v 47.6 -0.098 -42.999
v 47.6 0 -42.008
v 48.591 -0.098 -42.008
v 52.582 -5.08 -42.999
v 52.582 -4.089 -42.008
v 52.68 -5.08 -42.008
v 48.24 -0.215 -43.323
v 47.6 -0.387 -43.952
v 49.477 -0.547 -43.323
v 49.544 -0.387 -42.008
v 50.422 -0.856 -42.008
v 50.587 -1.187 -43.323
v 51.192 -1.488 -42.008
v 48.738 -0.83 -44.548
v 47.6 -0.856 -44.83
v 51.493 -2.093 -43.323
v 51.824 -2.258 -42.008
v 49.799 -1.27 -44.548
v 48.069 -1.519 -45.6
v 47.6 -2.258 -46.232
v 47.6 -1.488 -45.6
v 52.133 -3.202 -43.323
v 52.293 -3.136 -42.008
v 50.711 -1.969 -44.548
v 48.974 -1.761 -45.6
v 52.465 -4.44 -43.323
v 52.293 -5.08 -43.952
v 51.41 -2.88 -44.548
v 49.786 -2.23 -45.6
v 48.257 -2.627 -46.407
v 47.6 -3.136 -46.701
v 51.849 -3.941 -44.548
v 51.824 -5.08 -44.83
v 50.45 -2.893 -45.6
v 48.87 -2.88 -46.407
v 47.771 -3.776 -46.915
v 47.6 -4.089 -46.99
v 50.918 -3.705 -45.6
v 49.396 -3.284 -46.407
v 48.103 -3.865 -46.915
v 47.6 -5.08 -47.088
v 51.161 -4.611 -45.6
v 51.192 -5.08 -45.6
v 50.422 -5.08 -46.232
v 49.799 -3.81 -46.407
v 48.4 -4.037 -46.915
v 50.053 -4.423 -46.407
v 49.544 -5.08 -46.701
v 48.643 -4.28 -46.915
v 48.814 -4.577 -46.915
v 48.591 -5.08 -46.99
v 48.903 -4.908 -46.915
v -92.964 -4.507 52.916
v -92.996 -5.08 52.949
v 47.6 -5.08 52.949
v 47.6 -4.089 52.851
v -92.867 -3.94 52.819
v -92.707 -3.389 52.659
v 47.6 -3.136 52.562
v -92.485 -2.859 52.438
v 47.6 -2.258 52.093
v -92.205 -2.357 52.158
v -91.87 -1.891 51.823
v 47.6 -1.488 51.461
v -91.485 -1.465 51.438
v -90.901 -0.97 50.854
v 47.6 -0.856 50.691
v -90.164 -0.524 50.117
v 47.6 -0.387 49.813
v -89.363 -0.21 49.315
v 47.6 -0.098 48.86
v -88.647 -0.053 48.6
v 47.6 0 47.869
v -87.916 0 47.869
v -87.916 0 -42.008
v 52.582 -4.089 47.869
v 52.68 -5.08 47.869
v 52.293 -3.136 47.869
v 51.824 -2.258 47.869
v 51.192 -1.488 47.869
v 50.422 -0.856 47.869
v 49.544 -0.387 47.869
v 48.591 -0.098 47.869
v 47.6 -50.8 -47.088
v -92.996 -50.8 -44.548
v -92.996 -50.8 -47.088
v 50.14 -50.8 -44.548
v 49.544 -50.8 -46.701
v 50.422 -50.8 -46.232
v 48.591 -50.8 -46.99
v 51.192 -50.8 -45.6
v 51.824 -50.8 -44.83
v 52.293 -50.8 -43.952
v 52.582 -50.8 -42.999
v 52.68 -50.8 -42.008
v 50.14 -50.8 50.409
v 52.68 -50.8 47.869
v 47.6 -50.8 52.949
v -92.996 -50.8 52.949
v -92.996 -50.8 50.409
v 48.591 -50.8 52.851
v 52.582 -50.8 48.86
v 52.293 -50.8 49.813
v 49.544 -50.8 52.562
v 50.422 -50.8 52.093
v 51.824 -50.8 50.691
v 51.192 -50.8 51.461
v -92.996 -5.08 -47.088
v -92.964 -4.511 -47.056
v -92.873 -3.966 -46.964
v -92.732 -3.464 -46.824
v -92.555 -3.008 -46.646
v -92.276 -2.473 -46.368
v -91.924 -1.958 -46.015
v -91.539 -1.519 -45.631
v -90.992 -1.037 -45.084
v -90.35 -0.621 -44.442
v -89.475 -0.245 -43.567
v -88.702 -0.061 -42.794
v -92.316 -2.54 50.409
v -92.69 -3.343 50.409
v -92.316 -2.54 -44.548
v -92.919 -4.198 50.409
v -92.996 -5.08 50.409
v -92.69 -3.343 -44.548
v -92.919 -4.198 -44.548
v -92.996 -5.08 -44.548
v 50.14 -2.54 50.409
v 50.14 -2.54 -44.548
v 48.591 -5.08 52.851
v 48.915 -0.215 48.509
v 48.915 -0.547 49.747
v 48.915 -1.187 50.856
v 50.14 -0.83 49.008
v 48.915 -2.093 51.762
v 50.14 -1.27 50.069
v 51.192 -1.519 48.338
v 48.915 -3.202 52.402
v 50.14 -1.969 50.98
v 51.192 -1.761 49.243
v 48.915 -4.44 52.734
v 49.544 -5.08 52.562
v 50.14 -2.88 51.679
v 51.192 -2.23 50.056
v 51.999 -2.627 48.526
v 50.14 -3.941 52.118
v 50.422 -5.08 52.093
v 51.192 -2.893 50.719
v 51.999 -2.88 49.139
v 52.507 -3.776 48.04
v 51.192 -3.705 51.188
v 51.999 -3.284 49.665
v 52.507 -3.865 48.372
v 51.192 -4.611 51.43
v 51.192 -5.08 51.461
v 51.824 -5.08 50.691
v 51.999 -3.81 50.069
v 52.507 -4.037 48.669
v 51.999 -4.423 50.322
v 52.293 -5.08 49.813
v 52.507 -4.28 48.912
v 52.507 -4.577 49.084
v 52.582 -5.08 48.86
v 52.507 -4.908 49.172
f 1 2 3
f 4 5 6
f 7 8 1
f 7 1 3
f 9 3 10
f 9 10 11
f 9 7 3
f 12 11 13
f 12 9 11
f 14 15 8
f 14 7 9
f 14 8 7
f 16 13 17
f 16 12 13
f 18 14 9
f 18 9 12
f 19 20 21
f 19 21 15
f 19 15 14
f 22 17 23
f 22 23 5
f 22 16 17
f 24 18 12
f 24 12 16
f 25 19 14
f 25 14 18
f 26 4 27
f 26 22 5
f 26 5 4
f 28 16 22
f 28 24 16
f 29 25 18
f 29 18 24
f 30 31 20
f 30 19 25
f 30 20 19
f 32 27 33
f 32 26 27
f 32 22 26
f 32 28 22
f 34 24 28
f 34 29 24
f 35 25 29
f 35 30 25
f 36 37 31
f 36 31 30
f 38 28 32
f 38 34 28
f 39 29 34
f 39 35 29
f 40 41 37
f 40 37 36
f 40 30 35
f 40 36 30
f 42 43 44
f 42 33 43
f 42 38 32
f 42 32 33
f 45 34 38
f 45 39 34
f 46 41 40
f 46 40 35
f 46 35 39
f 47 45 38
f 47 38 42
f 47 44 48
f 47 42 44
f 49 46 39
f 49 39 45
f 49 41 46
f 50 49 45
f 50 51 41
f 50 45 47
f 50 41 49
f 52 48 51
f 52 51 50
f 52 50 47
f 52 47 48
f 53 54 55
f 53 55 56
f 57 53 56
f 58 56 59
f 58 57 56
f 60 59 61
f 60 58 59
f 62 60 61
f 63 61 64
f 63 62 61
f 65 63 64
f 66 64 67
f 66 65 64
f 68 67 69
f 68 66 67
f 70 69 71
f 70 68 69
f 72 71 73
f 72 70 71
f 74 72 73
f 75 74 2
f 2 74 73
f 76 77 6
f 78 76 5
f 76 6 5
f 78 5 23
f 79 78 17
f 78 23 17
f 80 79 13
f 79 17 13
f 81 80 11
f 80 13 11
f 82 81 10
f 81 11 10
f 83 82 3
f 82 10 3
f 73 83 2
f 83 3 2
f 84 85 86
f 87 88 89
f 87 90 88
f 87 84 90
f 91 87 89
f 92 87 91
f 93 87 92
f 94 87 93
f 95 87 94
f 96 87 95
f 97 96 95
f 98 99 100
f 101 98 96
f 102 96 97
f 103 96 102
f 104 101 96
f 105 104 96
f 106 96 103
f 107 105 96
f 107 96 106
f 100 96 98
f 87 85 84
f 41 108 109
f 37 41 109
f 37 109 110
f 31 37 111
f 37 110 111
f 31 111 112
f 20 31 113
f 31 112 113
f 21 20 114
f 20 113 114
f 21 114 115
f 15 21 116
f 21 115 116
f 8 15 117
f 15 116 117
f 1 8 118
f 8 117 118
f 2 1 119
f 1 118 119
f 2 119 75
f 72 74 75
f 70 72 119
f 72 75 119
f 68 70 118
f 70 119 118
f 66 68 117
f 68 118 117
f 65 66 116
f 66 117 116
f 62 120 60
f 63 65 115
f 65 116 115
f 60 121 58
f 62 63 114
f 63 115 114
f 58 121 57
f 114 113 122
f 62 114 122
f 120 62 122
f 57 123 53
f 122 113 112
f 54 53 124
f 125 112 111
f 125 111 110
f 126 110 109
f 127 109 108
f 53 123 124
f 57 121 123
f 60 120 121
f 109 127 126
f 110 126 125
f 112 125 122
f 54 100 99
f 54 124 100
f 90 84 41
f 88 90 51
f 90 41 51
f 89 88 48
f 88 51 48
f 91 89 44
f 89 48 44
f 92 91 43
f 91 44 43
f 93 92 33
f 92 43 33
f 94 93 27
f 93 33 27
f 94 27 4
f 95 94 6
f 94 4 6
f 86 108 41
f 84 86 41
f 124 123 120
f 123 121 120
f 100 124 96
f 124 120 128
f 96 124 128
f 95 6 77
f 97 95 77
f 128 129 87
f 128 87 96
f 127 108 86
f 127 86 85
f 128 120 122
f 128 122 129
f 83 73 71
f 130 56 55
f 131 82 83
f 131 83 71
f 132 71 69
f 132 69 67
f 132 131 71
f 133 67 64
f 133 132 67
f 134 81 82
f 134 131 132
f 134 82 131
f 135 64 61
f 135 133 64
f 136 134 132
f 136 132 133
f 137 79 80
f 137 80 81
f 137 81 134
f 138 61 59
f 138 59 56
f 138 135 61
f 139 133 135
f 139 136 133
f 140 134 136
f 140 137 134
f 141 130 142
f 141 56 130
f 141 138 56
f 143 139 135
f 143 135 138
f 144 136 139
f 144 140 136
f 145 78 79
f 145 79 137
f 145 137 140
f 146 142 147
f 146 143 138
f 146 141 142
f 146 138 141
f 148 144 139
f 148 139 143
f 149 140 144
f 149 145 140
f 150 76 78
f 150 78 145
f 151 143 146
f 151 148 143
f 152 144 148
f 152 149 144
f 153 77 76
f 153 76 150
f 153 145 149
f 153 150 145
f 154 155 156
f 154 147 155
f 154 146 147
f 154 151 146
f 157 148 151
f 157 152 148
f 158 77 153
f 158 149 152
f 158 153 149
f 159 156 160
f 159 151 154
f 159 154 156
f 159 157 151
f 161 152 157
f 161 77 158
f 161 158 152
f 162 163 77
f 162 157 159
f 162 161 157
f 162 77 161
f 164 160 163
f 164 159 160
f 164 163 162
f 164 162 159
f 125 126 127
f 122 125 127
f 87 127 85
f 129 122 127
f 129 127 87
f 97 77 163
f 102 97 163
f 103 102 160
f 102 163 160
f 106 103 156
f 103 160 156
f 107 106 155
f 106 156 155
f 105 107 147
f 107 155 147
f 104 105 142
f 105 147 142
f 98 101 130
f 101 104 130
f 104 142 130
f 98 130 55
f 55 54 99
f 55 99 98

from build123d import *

# Parameters (mm, degrees)
F0_W         = 145.6760466099
F0_H         = 100.0369116664
F0_W_2       = 138.8105116785
F0_H_2       = 92.9268449545
F1_DEPTH     = 25.4
F2_T         = -2.54
F3_T1_DEPTH  = 171.0760466099
F3_T3_DEPTH  = 125.4369116664
F4_DEPTH     = 25.4
F5_T1_DEPTH  = 58.42
F5_S5_W      = 5.08
F5_S5_H      = 5.08
F5_T6_DEPTH  = 5.08
F5_S11_W     = 5.08
F5_S11_H     = 5.08
F5_T12_DEPTH = 5.08


# Not quite as in the source:
# - a fillet or chamfer that OpenCascade refuses, or shapes differently, is made with other operations: its cross-section is extruded or revolved along the edge and cut away or added


with BuildPart() as f1:
    # F0 (on Front) → F1 (new body)
    with BuildSketch(Plane.XZ):
        with Locations((-20.1583206654, 2.9303953052)):
            Rectangle(F0_W, F0_H)
        with Locations((-20.7056272775, 3.0381605029)):
            Rectangle(F0_W_2, F0_H_2, mode=Mode.SUBTRACT)
        with Locations((-20.7056272775, 3.0381605029)):
            Rectangle(F0_W_2, F0_H_2)
    extrude(amount=F1_DEPTH)

    # F2
    f2_openings = [f1.faces().sort_by_distance(p)[0] for p in [
        (-20.158321, -25.4, 2.930395),
        (-92.996344, -12.7, 2.930395),
    ]]
    offset(amount=F2_T, openings=f2_openings)

    # F3: fillet of radius 5.08 on 4 edges, made by hand

    # F3_s2 → F3_t1 (cut)
    with BuildSketch(Plane.YZ.offset(-105.6963439703)):
        with BuildLine():
            ThreePointArc((-5.08, 52.9488511384), (-1.4878975516, 51.4609535868), (0, 47.8688511384))
            Line((0, 47.8688511384), (0, 52.9488511384))
            Line((0, 52.9488511384), (-5.08, 52.9488511384))
        make_face()
        with BuildLine():
            ThreePointArc((-5.08, -47.088060528), (-1.4878975516, -45.6001629765), (0, -42.008060528))
            Line((0, -42.008060528), (0, -47.088060528))
            Line((0, -47.088060528), (-5.08, -47.088060528))
        make_face()
    extrude(amount=F3_T1_DEPTH, mode=Mode.SUBTRACT)

    # F3_s4 → F3_t3 (cut)
    with BuildSketch(Plane.XY.offset(-59.788060528)):
        with BuildLine():
            ThreePointArc((-87.9163439703, 0), (-91.5084464187, -1.4878975516), (-92.9963439703, -5.08))
            Line((-92.9963439703, -5.08), (-92.9963439703, 0))
            Line((-92.9963439703, 0), (-87.9163439703, 0))
        make_face()
        with BuildLine():
            ThreePointArc((52.6797026396, -5.08), (51.191805088, -1.4878975516), (47.5997026396, 0))
            Line((47.5997026396, 0), (52.6797026396, 0))
            Line((52.6797026396, 0), (52.6797026396, -5.08))
        make_face()
    extrude(amount=F3_T3_DEPTH, mode=Mode.SUBTRACT)

    # F4 (add): a face of the model
    f4_faces = [f1.faces().sort_by_distance(p)[0] for p in [
        (-20.1583206654, -25.4, 51.1816812469),
    ]]
    extrude(f4_faces, amount=F4_DEPTH)

    # F5: fillet of radius 5.08 on 2 edges, made by hand

    # F5_s2 → F5_t1 (cut)
    with BuildSketch(Plane.XZ.offset(5.08)):
        with BuildLine():
            ThreePointArc((52.6797026396, 47.8688511384), (51.191805088, 51.4609535868), (47.5997026396, 52.9488511384))
            Line((47.5997026396, 52.9488511384), (52.6797026396, 52.9488511384))
            Line((52.6797026396, 52.9488511384), (52.6797026396, 47.8688511384))
        make_face()
        with BuildLine():
            ThreePointArc((47.5997026396, -47.088060528), (51.191805088, -45.6001629765), (52.6797026396, -42.008060528))
            Line((52.6797026396, -42.008060528), (52.6797026396, -47.088060528))
            Line((52.6797026396, -47.088060528), (47.5997026396, -47.088060528))
        make_face()
    extrude(amount=F5_T1_DEPTH, mode=Mode.SUBTRACT)


with BuildPart() as f5_tool4:
    # F5_s5 → F5_t6 (new body)
    with BuildSketch(Plane.XY.offset(-42.008060528)):
        with Locations((50.1397026396, -2.54)):
            Rectangle(F5_S5_W, F5_S5_H)
    extrude(amount=-F5_T6_DEPTH)

    # F5_s7 → F5_t8 (revolve, cut)
    with BuildSketch(Plane(origin=(47.5997026396, -5.08, -42.008060528), x_dir=(-0.7071067812, -0.7071067812, 0), z_dir=(0.7071067812, -0.7071067812, 0))):
        with BuildLine():
            ThreePointArc((0, -5.08), (5.08, 0), (0, 5.08))
            Line((0, 5.08), (0, -5.08))
        make_face()
    revolve(axis=Axis((47.5997026396, -5.08, -42.008060528), (0, 0, -1)), mode=Mode.SUBTRACT)


with BuildPart() as f1_1:
    add(f1.part)

    # F5_t3: cut F5_tool4
    add(f5_tool4.part, mode=Mode.SUBTRACT)


with BuildPart() as f5_tool10:
    # F5_s11 → F5_t12 (new body)
    with BuildSketch(Plane.YZ.offset(47.5997026396)):
        with Locations((-2.54, 50.4088511384)):
            Rectangle(F5_S11_W, F5_S11_H)
    extrude(amount=F5_T12_DEPTH)

    # F5_s13 → F5_t14 (revolve, cut)
    with BuildSketch(Plane(origin=(47.5997026396, -5.08, 47.8688511384), x_dir=(0, -0.7071067812, -0.7071067812), z_dir=(0, -0.7071067812, 0.7071067812))):
        with BuildLine():
            ThreePointArc((0, -5.08), (5.08, 0), (0, 5.08))
            Line((0, 5.08), (0, -5.08))
        make_face()
    revolve(axis=Axis((47.5997026396, -5.08, 47.8688511384), (1, 0, 0)), mode=Mode.SUBTRACT)


with BuildPart() as f1_2:
    add(f1_1.part)

    # F5_t9: cut F5_tool10
    add(f5_tool10.part, mode=Mode.SUBTRACT)


solid = f1_2.part
